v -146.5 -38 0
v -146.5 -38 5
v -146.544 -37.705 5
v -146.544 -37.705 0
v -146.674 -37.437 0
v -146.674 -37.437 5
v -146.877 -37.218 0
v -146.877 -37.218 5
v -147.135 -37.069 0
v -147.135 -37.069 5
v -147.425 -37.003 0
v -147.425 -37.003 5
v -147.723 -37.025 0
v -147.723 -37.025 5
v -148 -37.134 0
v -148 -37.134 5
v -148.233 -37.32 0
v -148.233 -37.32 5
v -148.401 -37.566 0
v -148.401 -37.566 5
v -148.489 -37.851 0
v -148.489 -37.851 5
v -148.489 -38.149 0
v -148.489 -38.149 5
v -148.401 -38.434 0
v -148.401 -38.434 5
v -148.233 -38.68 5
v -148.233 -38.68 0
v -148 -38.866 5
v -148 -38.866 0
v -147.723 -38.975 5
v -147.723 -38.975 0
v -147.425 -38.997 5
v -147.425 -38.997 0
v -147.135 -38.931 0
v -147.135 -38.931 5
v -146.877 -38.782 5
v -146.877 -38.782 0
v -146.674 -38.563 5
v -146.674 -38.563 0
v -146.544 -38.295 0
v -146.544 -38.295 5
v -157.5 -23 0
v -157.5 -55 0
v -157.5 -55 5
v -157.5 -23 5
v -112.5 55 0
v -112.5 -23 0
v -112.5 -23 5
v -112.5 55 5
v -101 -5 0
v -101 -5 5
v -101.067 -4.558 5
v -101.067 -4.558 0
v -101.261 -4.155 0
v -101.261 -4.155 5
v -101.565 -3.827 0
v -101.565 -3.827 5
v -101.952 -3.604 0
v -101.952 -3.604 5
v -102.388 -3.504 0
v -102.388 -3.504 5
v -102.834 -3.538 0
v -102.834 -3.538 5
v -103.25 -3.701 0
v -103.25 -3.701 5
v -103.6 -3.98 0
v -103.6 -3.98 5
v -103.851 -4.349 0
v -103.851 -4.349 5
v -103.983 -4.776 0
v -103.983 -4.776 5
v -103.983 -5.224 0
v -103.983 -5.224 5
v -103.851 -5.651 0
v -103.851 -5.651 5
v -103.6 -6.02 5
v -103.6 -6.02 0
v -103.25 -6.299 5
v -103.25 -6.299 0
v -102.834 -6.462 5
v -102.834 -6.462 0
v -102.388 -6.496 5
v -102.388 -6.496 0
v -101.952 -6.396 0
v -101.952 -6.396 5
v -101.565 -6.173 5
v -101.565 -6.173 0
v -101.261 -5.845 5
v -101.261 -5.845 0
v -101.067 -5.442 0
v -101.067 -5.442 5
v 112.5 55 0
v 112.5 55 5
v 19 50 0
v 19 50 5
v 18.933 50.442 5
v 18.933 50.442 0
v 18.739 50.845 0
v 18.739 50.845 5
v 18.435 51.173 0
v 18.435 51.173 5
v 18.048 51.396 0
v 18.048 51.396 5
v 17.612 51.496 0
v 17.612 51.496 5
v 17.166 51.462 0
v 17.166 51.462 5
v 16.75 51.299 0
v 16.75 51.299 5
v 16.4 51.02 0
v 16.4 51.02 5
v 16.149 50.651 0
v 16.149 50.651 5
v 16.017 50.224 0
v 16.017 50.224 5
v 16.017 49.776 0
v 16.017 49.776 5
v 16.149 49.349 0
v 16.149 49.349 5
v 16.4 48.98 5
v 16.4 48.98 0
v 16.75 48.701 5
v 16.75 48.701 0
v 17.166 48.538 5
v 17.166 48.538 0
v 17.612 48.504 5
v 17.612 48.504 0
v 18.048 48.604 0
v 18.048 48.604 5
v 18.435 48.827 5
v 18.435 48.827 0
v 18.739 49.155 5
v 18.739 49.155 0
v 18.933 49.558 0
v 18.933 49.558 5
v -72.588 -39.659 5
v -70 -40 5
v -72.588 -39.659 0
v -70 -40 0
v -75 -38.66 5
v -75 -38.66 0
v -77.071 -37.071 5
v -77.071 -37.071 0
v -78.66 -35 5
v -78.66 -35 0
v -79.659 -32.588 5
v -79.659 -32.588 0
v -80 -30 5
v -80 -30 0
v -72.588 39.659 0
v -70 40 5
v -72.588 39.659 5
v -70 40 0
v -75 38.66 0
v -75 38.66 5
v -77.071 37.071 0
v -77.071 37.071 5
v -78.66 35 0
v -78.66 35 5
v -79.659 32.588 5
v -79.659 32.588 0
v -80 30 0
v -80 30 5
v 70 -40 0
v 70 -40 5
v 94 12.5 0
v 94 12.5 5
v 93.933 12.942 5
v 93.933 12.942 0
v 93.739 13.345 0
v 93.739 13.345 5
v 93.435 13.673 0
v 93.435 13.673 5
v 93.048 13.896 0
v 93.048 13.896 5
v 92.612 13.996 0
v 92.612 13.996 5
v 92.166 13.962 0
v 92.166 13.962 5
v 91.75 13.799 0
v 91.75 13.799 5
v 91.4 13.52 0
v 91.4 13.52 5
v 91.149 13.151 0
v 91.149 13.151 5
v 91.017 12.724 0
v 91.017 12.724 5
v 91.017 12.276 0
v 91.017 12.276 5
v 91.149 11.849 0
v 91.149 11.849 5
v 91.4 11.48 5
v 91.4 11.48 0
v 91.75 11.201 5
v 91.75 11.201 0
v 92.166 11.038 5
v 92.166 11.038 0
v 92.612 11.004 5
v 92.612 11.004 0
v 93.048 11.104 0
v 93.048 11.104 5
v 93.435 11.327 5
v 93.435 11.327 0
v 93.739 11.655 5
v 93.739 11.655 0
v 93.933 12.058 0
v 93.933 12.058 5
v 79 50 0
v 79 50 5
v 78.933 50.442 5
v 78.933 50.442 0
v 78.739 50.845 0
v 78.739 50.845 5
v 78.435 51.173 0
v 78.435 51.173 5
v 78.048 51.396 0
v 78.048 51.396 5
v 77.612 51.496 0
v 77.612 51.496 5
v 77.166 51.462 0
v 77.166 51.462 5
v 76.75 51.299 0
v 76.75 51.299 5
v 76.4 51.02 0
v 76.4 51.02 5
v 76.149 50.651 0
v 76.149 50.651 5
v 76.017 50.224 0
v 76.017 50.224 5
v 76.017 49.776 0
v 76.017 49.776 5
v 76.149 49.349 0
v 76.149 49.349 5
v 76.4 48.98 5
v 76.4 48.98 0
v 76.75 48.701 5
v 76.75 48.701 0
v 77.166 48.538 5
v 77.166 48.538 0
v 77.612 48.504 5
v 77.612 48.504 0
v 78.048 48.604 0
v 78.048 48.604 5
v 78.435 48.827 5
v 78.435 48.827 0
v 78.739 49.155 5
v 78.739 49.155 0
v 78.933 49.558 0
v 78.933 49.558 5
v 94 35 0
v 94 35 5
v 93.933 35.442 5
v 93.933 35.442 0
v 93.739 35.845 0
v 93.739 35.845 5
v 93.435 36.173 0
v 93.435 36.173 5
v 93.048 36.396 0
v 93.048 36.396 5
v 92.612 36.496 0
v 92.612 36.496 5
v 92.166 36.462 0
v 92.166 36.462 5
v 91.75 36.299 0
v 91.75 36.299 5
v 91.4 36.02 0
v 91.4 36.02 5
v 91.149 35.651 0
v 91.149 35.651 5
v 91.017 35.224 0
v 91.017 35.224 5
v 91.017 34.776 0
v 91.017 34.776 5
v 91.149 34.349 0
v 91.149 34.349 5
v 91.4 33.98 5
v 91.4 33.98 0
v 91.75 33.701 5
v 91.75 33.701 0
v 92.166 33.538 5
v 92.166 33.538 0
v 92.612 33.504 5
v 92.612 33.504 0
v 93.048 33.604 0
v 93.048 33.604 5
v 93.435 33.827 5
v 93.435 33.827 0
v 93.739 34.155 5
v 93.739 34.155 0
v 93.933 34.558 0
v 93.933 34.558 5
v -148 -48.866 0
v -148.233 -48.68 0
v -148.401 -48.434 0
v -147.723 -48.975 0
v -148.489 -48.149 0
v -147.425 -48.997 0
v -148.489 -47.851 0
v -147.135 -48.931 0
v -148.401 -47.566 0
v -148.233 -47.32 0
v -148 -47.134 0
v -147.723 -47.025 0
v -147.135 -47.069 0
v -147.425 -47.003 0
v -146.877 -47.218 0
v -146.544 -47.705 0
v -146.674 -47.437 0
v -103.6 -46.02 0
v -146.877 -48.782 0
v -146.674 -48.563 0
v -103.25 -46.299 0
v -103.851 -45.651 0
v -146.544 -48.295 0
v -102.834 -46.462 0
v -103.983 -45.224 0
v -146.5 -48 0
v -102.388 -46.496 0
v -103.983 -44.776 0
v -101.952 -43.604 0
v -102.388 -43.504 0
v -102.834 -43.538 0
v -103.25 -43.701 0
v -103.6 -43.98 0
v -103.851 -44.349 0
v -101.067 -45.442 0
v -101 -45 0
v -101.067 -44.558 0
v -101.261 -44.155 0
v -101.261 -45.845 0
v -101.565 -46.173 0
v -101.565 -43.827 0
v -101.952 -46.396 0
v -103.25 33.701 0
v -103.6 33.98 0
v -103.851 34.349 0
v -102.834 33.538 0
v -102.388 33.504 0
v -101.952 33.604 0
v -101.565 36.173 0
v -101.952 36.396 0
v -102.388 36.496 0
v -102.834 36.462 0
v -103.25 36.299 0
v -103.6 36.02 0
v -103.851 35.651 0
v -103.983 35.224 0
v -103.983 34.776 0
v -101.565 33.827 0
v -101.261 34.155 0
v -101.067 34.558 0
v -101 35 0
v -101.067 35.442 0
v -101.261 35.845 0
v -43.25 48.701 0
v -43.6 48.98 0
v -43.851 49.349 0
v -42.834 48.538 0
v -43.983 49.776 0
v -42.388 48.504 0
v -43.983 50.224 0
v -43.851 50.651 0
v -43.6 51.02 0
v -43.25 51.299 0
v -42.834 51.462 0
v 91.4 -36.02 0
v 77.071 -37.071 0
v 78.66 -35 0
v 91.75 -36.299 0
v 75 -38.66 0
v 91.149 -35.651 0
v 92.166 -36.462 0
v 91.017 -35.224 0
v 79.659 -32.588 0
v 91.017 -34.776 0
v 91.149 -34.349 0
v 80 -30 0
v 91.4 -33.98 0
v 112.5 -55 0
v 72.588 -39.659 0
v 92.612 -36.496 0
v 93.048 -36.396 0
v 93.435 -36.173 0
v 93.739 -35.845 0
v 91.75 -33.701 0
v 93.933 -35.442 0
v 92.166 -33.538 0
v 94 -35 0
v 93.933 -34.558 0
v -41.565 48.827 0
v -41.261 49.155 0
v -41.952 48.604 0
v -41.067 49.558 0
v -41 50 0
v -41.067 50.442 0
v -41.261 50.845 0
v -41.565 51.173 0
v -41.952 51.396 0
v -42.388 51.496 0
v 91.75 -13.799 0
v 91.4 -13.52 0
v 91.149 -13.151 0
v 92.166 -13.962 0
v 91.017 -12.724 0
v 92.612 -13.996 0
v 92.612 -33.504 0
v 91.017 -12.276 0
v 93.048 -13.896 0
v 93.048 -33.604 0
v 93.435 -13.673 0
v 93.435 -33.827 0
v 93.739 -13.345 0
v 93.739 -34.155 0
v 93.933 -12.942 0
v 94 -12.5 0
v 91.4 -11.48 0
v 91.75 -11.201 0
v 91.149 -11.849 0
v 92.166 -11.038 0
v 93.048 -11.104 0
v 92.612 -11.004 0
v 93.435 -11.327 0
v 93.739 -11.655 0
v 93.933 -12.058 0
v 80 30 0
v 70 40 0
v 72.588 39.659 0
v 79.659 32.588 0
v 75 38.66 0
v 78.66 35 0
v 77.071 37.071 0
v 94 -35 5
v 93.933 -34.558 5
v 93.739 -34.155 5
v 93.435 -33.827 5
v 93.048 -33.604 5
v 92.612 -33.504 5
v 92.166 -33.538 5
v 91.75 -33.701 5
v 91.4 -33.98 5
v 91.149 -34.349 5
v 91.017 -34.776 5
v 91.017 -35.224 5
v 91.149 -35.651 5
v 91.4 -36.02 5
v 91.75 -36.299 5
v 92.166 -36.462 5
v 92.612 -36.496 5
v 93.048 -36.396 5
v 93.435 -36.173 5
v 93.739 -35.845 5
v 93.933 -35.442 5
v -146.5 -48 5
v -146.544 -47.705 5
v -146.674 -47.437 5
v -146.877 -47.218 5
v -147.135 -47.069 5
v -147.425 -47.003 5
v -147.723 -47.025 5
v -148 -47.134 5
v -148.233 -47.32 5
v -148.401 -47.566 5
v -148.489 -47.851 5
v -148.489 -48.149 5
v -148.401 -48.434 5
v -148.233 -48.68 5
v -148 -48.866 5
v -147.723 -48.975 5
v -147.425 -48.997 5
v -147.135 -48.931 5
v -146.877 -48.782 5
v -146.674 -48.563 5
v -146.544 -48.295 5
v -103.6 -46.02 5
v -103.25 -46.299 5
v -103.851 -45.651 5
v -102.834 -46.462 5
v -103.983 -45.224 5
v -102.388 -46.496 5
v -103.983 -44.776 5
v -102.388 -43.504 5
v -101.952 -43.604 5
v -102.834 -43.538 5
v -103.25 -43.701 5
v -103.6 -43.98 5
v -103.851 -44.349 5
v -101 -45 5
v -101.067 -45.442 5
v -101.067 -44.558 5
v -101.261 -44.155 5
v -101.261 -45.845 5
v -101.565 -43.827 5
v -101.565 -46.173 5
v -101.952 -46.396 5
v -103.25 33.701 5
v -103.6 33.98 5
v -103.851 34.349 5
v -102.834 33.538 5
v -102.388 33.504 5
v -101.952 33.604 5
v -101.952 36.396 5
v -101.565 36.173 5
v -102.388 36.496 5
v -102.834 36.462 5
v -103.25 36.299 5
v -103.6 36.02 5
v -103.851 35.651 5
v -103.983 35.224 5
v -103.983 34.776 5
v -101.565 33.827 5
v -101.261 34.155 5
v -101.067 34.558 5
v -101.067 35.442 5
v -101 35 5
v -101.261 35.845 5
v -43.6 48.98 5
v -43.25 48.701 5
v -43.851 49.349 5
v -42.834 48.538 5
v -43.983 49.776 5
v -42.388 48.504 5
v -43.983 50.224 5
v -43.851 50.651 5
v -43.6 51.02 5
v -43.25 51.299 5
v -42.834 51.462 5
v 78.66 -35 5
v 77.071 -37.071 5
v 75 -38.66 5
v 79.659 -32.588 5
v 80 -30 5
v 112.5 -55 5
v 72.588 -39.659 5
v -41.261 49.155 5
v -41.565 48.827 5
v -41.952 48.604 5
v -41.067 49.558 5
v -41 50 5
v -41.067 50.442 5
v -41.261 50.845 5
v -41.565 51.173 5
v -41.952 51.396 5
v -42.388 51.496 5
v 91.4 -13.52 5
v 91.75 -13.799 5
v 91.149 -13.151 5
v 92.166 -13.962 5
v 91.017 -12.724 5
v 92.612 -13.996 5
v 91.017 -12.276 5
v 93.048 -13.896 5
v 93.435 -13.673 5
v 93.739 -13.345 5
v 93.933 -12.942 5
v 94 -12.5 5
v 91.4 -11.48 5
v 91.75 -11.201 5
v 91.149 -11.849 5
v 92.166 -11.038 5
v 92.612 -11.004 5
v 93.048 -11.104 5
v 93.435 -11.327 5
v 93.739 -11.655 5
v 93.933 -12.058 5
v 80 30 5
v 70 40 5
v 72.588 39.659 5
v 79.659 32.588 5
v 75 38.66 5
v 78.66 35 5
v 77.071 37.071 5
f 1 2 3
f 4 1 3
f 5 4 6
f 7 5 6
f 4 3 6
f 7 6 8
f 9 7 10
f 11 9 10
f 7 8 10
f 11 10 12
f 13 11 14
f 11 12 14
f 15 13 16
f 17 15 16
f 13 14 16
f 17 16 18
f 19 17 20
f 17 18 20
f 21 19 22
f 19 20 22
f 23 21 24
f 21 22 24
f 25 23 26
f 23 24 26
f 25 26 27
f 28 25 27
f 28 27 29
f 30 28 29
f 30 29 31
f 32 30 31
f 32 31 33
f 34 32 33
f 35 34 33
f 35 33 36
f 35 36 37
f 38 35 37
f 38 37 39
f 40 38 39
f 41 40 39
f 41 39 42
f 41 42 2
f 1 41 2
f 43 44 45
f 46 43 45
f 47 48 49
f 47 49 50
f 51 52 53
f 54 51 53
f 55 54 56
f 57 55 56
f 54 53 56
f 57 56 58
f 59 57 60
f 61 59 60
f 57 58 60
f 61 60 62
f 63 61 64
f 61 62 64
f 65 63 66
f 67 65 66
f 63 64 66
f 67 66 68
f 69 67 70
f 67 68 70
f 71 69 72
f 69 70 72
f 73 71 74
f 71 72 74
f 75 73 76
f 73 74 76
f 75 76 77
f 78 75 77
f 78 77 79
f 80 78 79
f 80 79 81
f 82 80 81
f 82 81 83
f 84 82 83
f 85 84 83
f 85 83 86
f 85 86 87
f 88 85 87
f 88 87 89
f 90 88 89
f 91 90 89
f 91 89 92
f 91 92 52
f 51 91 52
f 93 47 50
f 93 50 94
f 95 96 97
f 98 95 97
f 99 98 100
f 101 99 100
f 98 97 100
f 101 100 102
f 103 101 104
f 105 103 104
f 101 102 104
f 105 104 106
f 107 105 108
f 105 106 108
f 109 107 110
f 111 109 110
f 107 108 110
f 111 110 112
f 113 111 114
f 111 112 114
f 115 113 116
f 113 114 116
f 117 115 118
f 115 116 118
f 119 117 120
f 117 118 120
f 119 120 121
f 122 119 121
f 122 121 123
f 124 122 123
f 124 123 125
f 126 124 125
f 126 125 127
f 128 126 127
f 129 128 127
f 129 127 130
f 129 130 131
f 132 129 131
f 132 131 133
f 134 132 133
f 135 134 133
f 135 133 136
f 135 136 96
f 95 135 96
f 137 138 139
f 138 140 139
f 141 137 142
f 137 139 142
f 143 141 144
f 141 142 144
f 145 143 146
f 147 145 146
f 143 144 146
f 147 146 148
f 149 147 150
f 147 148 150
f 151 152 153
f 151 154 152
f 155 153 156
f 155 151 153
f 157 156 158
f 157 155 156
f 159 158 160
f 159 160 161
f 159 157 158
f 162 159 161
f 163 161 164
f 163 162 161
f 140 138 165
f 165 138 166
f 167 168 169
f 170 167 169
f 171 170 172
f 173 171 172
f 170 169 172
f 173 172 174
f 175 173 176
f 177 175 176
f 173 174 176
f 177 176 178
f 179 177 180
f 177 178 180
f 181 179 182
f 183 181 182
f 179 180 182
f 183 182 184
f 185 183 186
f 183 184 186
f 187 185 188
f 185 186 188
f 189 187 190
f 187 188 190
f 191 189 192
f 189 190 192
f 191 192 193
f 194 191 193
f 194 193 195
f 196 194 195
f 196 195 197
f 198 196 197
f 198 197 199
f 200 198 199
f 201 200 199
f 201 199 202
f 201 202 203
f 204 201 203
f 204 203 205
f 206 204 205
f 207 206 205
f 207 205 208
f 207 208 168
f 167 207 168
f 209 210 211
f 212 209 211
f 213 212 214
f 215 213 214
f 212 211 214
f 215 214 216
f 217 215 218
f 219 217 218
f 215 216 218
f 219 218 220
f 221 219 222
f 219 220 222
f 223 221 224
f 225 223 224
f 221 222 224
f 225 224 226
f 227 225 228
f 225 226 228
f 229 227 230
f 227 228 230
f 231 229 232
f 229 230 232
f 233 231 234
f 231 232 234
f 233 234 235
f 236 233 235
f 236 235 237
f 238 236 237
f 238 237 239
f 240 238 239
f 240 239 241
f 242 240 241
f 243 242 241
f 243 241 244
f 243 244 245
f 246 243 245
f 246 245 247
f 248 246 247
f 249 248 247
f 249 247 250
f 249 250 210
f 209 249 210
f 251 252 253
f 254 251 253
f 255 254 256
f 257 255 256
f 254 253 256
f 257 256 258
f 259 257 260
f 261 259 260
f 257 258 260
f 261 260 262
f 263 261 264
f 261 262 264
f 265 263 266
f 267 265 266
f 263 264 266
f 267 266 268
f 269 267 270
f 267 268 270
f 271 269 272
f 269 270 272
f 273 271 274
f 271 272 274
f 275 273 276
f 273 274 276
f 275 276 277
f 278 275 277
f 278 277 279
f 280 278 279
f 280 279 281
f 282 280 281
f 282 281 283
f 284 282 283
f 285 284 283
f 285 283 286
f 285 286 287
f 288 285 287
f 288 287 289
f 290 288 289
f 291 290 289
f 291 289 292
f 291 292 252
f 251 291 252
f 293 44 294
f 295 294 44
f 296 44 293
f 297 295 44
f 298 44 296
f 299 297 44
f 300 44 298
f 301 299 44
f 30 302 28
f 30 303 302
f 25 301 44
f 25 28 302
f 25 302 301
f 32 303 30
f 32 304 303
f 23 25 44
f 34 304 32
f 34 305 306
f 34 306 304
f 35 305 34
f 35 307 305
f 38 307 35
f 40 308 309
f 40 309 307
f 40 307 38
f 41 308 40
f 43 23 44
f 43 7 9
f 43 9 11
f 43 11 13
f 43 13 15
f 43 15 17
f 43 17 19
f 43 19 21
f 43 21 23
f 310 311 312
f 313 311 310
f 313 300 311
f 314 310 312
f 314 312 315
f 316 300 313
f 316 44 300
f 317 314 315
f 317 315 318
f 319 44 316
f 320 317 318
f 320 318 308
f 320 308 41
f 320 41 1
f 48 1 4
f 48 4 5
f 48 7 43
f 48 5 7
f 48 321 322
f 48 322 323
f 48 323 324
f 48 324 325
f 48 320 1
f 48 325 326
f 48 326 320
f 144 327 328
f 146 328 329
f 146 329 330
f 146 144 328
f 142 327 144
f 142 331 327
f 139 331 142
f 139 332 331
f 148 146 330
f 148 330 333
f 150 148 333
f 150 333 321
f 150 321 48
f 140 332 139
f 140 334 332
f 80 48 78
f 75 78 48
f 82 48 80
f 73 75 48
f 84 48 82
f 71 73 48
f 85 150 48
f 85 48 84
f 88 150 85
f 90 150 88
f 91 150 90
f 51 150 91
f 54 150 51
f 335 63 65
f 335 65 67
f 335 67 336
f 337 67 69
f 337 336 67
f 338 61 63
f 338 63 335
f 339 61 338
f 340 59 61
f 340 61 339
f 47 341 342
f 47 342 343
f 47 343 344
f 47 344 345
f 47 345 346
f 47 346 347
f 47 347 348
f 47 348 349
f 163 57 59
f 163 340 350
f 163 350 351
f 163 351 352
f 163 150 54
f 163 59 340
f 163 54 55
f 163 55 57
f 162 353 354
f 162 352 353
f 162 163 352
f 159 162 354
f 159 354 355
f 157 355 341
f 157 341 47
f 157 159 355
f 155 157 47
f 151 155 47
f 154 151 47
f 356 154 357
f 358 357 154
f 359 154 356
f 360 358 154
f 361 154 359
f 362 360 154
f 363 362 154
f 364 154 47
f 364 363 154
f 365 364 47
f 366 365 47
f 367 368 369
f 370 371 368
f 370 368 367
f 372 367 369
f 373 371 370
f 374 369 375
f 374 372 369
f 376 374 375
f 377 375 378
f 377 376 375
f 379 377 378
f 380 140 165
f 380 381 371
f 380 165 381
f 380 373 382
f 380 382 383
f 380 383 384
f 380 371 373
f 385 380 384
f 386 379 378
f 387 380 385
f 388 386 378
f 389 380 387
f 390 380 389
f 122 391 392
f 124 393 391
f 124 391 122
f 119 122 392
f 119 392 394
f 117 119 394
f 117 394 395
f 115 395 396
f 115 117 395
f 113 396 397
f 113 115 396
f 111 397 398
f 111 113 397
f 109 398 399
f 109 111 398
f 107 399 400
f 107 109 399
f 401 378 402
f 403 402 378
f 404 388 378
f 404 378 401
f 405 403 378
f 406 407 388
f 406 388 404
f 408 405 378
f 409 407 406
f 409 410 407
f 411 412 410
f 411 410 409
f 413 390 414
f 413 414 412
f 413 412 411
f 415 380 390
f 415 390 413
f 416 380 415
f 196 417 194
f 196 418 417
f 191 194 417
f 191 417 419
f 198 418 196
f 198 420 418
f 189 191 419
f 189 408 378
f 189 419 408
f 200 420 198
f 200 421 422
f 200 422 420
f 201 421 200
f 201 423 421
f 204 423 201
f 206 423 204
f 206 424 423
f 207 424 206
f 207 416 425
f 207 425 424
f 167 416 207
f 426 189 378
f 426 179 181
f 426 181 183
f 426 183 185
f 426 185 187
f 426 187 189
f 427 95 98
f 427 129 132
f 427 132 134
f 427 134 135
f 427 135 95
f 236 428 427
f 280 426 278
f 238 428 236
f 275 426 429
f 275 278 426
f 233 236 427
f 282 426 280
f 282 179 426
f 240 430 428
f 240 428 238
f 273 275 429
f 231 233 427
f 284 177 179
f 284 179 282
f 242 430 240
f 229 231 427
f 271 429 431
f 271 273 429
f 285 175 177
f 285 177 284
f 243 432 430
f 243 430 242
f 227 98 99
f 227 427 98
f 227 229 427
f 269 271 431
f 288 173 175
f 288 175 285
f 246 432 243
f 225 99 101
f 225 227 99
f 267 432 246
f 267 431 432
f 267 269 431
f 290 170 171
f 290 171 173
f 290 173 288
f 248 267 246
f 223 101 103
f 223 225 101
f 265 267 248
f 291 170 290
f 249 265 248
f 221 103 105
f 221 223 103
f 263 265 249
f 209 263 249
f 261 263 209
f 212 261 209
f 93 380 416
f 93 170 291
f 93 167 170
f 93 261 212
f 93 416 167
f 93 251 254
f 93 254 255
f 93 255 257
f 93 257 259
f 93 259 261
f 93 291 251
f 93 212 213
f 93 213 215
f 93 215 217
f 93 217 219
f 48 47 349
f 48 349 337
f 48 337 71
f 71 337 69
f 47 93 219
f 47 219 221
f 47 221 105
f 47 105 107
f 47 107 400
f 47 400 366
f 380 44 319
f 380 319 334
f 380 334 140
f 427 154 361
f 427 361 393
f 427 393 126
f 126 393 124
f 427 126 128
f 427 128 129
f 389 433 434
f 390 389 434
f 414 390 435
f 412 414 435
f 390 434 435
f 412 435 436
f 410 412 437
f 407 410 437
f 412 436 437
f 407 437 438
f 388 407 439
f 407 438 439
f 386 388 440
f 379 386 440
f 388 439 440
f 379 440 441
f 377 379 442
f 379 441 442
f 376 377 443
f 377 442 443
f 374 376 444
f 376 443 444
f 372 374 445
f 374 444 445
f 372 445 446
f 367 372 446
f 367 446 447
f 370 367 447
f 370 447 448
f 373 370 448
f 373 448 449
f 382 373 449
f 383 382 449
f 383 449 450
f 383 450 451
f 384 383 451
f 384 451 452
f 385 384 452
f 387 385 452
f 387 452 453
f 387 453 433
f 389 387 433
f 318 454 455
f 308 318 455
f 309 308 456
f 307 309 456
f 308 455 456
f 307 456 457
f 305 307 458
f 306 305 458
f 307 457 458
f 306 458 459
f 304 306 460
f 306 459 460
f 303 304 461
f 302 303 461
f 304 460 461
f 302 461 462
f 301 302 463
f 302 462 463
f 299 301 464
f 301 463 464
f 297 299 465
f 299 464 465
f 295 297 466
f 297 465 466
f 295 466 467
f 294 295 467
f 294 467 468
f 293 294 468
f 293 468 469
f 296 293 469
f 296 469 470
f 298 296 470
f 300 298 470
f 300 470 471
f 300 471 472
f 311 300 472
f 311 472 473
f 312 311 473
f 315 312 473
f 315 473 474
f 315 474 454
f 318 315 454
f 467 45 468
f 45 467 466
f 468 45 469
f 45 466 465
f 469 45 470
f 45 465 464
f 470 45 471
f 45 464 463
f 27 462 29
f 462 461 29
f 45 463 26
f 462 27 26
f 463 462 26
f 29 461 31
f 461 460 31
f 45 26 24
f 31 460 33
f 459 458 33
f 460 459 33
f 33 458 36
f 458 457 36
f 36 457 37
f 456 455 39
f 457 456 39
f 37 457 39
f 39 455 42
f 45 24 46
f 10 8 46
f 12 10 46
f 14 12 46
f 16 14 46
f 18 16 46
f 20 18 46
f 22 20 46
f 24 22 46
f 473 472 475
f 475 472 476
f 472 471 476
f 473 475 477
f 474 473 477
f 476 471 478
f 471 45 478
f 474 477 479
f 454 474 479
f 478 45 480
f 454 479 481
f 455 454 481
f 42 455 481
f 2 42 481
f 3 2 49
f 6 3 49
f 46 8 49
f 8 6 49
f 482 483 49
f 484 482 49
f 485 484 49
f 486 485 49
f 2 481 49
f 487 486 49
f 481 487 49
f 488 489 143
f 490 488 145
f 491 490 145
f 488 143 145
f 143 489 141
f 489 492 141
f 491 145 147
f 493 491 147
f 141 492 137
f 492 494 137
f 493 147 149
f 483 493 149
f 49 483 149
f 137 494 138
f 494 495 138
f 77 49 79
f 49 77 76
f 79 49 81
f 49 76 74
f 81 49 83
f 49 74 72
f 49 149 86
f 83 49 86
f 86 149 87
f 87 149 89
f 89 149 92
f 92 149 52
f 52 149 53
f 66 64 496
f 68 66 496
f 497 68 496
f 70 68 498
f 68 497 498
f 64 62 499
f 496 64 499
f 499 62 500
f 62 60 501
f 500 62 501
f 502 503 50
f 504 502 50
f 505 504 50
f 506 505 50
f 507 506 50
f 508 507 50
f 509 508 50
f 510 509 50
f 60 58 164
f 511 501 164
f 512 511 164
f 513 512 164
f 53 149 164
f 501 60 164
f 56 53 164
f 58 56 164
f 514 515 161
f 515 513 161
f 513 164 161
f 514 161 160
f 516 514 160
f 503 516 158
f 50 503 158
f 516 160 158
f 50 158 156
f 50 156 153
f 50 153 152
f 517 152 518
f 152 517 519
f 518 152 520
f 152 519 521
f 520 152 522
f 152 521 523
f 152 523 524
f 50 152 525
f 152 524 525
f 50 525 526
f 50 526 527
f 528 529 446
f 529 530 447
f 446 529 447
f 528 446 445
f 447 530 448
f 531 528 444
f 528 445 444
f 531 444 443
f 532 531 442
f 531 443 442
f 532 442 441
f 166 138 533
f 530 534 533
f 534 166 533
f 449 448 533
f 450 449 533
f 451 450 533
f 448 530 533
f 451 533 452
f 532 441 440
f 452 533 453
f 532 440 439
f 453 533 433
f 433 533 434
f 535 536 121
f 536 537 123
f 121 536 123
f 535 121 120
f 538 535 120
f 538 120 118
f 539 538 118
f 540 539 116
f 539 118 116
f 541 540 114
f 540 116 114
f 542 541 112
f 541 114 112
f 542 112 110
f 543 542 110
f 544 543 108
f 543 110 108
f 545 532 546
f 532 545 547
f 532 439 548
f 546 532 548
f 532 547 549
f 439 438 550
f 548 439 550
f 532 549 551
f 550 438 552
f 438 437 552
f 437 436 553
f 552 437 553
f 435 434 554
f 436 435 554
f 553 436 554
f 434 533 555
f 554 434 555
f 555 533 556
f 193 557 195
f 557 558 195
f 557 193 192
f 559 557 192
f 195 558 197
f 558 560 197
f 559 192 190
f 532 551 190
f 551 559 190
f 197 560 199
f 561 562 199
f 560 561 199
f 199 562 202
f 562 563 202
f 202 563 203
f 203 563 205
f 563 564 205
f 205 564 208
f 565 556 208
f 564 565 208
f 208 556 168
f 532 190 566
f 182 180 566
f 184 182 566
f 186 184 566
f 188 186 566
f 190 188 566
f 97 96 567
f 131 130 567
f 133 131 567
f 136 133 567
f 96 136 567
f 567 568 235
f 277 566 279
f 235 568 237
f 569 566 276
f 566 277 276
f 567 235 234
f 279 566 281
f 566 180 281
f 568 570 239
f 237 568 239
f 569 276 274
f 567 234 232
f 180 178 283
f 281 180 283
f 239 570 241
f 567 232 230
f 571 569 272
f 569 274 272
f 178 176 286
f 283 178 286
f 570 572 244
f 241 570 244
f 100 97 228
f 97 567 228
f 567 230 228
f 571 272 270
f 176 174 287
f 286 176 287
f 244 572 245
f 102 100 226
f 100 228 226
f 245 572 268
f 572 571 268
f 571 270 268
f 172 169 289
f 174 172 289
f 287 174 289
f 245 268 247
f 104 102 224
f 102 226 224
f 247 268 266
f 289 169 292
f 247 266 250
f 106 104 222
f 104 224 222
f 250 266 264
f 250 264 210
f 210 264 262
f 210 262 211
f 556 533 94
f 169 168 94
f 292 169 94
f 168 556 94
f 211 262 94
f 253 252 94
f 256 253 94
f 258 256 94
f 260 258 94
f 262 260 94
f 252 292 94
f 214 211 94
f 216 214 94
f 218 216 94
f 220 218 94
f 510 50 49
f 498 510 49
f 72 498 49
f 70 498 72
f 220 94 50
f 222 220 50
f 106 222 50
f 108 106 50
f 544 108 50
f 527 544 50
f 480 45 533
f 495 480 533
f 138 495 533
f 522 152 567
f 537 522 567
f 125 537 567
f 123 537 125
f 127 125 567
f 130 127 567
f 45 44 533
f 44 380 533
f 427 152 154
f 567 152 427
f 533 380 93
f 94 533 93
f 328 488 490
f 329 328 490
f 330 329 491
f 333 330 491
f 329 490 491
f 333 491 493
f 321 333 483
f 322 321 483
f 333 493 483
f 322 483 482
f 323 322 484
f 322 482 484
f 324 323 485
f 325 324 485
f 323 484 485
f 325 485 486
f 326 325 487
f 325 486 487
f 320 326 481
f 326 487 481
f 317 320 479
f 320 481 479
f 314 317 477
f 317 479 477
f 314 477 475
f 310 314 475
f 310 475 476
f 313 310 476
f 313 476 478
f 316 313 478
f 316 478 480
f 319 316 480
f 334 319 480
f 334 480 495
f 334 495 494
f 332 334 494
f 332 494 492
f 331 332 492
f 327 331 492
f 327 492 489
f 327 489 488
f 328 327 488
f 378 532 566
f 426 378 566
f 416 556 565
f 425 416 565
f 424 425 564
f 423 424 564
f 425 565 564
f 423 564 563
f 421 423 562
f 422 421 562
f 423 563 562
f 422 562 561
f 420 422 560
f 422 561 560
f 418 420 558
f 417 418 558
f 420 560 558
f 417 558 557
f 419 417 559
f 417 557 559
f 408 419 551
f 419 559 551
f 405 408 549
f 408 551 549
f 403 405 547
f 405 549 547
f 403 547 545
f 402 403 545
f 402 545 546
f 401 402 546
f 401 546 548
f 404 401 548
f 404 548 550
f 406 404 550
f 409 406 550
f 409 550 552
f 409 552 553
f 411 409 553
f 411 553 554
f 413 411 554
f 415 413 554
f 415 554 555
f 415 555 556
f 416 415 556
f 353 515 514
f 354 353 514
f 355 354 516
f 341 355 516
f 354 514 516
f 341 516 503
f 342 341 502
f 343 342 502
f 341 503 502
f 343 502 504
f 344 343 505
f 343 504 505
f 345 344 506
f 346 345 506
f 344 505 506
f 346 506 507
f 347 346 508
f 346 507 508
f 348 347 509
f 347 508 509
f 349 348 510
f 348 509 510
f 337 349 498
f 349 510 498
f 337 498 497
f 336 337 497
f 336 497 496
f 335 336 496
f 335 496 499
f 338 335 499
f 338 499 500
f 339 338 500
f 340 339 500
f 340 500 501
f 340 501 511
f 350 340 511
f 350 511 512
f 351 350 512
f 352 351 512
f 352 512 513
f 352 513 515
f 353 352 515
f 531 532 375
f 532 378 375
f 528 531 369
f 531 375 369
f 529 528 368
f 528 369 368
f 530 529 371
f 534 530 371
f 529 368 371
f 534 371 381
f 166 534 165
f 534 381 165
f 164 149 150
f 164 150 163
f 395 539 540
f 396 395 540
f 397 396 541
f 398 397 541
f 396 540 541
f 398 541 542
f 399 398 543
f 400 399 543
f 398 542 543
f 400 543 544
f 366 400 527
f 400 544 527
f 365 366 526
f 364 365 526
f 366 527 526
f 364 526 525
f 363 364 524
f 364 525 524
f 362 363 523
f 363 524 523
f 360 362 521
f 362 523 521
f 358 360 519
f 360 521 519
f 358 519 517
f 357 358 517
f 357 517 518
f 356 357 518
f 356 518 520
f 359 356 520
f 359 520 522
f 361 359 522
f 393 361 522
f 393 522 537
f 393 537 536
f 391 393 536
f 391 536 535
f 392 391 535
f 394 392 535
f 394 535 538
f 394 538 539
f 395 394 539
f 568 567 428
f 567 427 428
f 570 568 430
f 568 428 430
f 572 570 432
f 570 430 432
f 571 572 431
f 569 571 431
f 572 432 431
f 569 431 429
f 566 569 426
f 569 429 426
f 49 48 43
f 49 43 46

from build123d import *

# Parameters (mm, degrees)
SKETCH1_W           = 225
SKETCH1_H           = 110
BOSS_EXTRUDE1_DEPTH = 5
SKETCH2_W           = 5
SKETCH2_H           = 32
BOSS_EXTRUDE2_DEPTH = 45
SKETCH3_R           = 1.5
CUT_EXTRUDE1_DEPTH  = 6
SKETCH4_R           = 1.5
CUT_EXTRUDE2_DEPTH  = 6
SKETCH5_R           = 1
CUT_EXTRUDE3_DEPTH  = 6
SKETCH6_W           = 160
SKETCH6_H           = 80
CUT_EXTRUDE4_DEPTH  = 6
FILLET1_R           = 10


with BuildPart() as part:
    # Sketch1 → Boss-Extrude1 (new body)
    with BuildSketch(Plane.XY):
        Rectangle(SKETCH1_W, SKETCH1_H)
    extrude(amount=BOSS_EXTRUDE1_DEPTH)

    # Sketch2 → Boss-Extrude2 (add)
    with BuildSketch(Plane.ZY.offset(112.5)):
        with Locations((2.5, -39)):
            Rectangle(SKETCH2_W, SKETCH2_H)
    extrude(amount=BOSS_EXTRUDE2_DEPTH)

    # Sketch3 → Cut-Extrude1 (cut, through all)
    with BuildSketch(Plane.XY.offset(5)):
        with Locations((92.5, 35)):
            Circle(SKETCH3_R)
        with Locations((92.5, 12.5)):
            Circle(SKETCH3_R)
        with Locations((92.5, -12.5)):
            Circle(SKETCH3_R)
        with Locations((92.5, -35)):
            Circle(SKETCH3_R)
    extrude(amount=-CUT_EXTRUDE1_DEPTH, mode=Mode.SUBTRACT)

    # Sketch4 → Cut-Extrude2 (cut, through all)
    with BuildSketch(Plane.XY.offset(5)):
        with Locations((-42.5, 50)):
            Circle(SKETCH4_R)
        with Locations((-102.5, 35)):
            Circle(SKETCH4_R)
        with Locations((17.5, 50)):
            Circle(SKETCH4_R)
        with Locations((77.5, 50)):
            Circle(SKETCH4_R)
        with Locations((-102.5, -5)):
            Circle(SKETCH4_R)
        with Locations((-102.5, -45)):
            Circle(SKETCH4_R)
    extrude(amount=-CUT_EXTRUDE2_DEPTH, mode=Mode.SUBTRACT)

    # Sketch5 → Cut-Extrude3 (cut, through all)
    with BuildSketch(Plane.XY.offset(5)):
        with Locations((-147.5, -38)):
            Circle(SKETCH5_R)
        with Locations((-147.5, -48)):
            Circle(SKETCH5_R)
    extrude(amount=-CUT_EXTRUDE3_DEPTH, mode=Mode.SUBTRACT)

    # Sketch6 → Cut-Extrude4 (cut, through all)
    with BuildSketch(Plane.XY.offset(5)):
        Rectangle(SKETCH6_W, SKETCH6_H)
    extrude(amount=-CUT_EXTRUDE4_DEPTH, mode=Mode.SUBTRACT)

    # Fillet1
    fillet1_edges = [part.edges().sort_by_distance(p)[0] for p in [
        (-80, -40, 2.5),
        (-80, 40, 2.5),
        (80, 40, 2.5),
        (80, -40, 2.5),
    ]]
    fillet(fillet1_edges, radius=FILLET1_R)


solid = part.part
